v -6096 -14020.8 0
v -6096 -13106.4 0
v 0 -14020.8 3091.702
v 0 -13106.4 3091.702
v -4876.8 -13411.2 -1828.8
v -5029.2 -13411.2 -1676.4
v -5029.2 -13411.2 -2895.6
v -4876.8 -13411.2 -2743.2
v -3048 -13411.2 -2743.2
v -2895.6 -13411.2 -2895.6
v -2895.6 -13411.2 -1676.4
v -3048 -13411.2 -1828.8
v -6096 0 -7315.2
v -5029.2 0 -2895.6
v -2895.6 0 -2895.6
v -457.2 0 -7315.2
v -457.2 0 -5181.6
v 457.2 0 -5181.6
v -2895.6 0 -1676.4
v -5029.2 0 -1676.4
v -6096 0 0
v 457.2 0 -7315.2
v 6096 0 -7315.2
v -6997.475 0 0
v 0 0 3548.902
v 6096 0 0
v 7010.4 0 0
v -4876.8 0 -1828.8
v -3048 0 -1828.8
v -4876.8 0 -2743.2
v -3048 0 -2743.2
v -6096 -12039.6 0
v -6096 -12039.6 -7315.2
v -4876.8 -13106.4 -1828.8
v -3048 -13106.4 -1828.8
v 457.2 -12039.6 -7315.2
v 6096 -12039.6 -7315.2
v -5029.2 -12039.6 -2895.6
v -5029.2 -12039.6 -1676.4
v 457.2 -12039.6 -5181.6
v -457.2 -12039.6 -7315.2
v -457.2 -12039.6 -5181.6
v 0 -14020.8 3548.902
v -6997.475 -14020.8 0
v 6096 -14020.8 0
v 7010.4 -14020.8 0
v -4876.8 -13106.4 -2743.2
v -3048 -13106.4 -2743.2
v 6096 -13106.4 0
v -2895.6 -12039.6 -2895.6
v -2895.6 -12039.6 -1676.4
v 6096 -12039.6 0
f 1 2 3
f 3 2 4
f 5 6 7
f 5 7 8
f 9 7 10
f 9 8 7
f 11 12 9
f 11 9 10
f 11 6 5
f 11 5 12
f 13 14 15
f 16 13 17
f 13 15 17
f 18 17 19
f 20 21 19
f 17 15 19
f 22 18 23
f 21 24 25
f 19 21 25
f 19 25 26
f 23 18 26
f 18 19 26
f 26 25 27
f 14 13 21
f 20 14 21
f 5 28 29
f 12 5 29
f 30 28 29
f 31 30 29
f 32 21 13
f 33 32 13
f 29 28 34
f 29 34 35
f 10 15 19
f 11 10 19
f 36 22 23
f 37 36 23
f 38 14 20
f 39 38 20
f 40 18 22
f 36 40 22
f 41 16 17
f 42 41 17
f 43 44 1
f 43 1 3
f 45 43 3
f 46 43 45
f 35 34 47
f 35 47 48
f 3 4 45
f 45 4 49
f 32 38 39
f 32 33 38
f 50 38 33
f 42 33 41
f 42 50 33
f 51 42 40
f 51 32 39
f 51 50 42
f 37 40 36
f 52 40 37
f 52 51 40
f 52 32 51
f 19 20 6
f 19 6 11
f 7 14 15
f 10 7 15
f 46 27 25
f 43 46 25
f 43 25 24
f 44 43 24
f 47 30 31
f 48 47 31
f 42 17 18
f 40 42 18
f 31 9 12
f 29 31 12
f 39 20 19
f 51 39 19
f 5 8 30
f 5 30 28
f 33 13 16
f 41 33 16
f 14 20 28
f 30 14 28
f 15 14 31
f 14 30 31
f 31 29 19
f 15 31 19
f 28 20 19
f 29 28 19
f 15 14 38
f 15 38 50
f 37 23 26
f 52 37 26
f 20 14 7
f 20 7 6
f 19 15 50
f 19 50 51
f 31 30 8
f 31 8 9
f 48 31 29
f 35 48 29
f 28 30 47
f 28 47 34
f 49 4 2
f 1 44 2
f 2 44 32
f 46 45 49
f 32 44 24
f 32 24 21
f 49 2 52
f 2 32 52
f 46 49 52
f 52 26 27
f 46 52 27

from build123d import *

# Parameters (mm, degrees)
F1_DEPTH = 14020.8
F2_DEPTH = 13106.4
F0_W     = 2133.6
F0_H     = 1219.2
F3_DEPTH = 12039.6
F0_W_2   = 1828.8
F0_H_2   = 914.4
F5_DEPTH = 13106.4
F6_DEPTH = 13411.2


# Not quite as in the source:
# - the program builds the solid bodies; features that only make, move or delete a surface that nothing else refers to are left out


with BuildPart() as f1:
    # F0 (on Front) → F1 (new body)
    with BuildSketch(Plane.XZ):
        Polygon((-6997.4747111522, 0), (-6096, 0), (0, 3091.7020361423), (0, 3548.9020361423), align=None)
        Polygon((0, 3548.9020361423), (0, 3091.7020361423), (6096, 0), (7010.4, 0), align=None)
    extrude(amount=F1_DEPTH)

    # F0 (on Front) → F2 (join)
    with BuildSketch(Plane.XZ):
        Polygon((0, 3091.7020361423), (-6096, 0), (0, 0), (6096, 0), align=None)
    extrude(amount=F2_DEPTH)

    # F0 (on Front) → F3 (join)
    with BuildSketch(Plane.XZ):
        Polygon((0, 0), (-6096, 0), (-6096, -7315.2), (-457.2, -7315.2), (-457.2, -5181.6), (457.2, -5181.6), (457.2, -7315.2), (6096, -7315.2), (6096, 0), align=None)
        with Locations((-3962.4, -2286)):
            Rectangle(F0_W, F0_H, mode=Mode.SUBTRACT)
    extrude(amount=F3_DEPTH)


with BuildPart() as f5:
    # F0 (on Front) → F5 (new body)
    with BuildSketch(Plane.XZ):
        with Locations((-3962.4, -2286)):
            Rectangle(F0_W_2, F0_H_2)
    extrude(amount=F5_DEPTH)


with BuildPart() as f6:
    # F0 (on Front) → F6 (new body)
    with BuildSketch(Plane.XZ):
        with Locations((-3962.4, -2286)):
            Rectangle(F0_W, F0_H)
        with Locations((-3962.4, -2286)):
            Rectangle(F0_W_2, F0_H_2, mode=Mode.SUBTRACT)
    extrude(amount=F6_DEPTH)


solid = Compound([f1.part, f5.part, f6.part])
